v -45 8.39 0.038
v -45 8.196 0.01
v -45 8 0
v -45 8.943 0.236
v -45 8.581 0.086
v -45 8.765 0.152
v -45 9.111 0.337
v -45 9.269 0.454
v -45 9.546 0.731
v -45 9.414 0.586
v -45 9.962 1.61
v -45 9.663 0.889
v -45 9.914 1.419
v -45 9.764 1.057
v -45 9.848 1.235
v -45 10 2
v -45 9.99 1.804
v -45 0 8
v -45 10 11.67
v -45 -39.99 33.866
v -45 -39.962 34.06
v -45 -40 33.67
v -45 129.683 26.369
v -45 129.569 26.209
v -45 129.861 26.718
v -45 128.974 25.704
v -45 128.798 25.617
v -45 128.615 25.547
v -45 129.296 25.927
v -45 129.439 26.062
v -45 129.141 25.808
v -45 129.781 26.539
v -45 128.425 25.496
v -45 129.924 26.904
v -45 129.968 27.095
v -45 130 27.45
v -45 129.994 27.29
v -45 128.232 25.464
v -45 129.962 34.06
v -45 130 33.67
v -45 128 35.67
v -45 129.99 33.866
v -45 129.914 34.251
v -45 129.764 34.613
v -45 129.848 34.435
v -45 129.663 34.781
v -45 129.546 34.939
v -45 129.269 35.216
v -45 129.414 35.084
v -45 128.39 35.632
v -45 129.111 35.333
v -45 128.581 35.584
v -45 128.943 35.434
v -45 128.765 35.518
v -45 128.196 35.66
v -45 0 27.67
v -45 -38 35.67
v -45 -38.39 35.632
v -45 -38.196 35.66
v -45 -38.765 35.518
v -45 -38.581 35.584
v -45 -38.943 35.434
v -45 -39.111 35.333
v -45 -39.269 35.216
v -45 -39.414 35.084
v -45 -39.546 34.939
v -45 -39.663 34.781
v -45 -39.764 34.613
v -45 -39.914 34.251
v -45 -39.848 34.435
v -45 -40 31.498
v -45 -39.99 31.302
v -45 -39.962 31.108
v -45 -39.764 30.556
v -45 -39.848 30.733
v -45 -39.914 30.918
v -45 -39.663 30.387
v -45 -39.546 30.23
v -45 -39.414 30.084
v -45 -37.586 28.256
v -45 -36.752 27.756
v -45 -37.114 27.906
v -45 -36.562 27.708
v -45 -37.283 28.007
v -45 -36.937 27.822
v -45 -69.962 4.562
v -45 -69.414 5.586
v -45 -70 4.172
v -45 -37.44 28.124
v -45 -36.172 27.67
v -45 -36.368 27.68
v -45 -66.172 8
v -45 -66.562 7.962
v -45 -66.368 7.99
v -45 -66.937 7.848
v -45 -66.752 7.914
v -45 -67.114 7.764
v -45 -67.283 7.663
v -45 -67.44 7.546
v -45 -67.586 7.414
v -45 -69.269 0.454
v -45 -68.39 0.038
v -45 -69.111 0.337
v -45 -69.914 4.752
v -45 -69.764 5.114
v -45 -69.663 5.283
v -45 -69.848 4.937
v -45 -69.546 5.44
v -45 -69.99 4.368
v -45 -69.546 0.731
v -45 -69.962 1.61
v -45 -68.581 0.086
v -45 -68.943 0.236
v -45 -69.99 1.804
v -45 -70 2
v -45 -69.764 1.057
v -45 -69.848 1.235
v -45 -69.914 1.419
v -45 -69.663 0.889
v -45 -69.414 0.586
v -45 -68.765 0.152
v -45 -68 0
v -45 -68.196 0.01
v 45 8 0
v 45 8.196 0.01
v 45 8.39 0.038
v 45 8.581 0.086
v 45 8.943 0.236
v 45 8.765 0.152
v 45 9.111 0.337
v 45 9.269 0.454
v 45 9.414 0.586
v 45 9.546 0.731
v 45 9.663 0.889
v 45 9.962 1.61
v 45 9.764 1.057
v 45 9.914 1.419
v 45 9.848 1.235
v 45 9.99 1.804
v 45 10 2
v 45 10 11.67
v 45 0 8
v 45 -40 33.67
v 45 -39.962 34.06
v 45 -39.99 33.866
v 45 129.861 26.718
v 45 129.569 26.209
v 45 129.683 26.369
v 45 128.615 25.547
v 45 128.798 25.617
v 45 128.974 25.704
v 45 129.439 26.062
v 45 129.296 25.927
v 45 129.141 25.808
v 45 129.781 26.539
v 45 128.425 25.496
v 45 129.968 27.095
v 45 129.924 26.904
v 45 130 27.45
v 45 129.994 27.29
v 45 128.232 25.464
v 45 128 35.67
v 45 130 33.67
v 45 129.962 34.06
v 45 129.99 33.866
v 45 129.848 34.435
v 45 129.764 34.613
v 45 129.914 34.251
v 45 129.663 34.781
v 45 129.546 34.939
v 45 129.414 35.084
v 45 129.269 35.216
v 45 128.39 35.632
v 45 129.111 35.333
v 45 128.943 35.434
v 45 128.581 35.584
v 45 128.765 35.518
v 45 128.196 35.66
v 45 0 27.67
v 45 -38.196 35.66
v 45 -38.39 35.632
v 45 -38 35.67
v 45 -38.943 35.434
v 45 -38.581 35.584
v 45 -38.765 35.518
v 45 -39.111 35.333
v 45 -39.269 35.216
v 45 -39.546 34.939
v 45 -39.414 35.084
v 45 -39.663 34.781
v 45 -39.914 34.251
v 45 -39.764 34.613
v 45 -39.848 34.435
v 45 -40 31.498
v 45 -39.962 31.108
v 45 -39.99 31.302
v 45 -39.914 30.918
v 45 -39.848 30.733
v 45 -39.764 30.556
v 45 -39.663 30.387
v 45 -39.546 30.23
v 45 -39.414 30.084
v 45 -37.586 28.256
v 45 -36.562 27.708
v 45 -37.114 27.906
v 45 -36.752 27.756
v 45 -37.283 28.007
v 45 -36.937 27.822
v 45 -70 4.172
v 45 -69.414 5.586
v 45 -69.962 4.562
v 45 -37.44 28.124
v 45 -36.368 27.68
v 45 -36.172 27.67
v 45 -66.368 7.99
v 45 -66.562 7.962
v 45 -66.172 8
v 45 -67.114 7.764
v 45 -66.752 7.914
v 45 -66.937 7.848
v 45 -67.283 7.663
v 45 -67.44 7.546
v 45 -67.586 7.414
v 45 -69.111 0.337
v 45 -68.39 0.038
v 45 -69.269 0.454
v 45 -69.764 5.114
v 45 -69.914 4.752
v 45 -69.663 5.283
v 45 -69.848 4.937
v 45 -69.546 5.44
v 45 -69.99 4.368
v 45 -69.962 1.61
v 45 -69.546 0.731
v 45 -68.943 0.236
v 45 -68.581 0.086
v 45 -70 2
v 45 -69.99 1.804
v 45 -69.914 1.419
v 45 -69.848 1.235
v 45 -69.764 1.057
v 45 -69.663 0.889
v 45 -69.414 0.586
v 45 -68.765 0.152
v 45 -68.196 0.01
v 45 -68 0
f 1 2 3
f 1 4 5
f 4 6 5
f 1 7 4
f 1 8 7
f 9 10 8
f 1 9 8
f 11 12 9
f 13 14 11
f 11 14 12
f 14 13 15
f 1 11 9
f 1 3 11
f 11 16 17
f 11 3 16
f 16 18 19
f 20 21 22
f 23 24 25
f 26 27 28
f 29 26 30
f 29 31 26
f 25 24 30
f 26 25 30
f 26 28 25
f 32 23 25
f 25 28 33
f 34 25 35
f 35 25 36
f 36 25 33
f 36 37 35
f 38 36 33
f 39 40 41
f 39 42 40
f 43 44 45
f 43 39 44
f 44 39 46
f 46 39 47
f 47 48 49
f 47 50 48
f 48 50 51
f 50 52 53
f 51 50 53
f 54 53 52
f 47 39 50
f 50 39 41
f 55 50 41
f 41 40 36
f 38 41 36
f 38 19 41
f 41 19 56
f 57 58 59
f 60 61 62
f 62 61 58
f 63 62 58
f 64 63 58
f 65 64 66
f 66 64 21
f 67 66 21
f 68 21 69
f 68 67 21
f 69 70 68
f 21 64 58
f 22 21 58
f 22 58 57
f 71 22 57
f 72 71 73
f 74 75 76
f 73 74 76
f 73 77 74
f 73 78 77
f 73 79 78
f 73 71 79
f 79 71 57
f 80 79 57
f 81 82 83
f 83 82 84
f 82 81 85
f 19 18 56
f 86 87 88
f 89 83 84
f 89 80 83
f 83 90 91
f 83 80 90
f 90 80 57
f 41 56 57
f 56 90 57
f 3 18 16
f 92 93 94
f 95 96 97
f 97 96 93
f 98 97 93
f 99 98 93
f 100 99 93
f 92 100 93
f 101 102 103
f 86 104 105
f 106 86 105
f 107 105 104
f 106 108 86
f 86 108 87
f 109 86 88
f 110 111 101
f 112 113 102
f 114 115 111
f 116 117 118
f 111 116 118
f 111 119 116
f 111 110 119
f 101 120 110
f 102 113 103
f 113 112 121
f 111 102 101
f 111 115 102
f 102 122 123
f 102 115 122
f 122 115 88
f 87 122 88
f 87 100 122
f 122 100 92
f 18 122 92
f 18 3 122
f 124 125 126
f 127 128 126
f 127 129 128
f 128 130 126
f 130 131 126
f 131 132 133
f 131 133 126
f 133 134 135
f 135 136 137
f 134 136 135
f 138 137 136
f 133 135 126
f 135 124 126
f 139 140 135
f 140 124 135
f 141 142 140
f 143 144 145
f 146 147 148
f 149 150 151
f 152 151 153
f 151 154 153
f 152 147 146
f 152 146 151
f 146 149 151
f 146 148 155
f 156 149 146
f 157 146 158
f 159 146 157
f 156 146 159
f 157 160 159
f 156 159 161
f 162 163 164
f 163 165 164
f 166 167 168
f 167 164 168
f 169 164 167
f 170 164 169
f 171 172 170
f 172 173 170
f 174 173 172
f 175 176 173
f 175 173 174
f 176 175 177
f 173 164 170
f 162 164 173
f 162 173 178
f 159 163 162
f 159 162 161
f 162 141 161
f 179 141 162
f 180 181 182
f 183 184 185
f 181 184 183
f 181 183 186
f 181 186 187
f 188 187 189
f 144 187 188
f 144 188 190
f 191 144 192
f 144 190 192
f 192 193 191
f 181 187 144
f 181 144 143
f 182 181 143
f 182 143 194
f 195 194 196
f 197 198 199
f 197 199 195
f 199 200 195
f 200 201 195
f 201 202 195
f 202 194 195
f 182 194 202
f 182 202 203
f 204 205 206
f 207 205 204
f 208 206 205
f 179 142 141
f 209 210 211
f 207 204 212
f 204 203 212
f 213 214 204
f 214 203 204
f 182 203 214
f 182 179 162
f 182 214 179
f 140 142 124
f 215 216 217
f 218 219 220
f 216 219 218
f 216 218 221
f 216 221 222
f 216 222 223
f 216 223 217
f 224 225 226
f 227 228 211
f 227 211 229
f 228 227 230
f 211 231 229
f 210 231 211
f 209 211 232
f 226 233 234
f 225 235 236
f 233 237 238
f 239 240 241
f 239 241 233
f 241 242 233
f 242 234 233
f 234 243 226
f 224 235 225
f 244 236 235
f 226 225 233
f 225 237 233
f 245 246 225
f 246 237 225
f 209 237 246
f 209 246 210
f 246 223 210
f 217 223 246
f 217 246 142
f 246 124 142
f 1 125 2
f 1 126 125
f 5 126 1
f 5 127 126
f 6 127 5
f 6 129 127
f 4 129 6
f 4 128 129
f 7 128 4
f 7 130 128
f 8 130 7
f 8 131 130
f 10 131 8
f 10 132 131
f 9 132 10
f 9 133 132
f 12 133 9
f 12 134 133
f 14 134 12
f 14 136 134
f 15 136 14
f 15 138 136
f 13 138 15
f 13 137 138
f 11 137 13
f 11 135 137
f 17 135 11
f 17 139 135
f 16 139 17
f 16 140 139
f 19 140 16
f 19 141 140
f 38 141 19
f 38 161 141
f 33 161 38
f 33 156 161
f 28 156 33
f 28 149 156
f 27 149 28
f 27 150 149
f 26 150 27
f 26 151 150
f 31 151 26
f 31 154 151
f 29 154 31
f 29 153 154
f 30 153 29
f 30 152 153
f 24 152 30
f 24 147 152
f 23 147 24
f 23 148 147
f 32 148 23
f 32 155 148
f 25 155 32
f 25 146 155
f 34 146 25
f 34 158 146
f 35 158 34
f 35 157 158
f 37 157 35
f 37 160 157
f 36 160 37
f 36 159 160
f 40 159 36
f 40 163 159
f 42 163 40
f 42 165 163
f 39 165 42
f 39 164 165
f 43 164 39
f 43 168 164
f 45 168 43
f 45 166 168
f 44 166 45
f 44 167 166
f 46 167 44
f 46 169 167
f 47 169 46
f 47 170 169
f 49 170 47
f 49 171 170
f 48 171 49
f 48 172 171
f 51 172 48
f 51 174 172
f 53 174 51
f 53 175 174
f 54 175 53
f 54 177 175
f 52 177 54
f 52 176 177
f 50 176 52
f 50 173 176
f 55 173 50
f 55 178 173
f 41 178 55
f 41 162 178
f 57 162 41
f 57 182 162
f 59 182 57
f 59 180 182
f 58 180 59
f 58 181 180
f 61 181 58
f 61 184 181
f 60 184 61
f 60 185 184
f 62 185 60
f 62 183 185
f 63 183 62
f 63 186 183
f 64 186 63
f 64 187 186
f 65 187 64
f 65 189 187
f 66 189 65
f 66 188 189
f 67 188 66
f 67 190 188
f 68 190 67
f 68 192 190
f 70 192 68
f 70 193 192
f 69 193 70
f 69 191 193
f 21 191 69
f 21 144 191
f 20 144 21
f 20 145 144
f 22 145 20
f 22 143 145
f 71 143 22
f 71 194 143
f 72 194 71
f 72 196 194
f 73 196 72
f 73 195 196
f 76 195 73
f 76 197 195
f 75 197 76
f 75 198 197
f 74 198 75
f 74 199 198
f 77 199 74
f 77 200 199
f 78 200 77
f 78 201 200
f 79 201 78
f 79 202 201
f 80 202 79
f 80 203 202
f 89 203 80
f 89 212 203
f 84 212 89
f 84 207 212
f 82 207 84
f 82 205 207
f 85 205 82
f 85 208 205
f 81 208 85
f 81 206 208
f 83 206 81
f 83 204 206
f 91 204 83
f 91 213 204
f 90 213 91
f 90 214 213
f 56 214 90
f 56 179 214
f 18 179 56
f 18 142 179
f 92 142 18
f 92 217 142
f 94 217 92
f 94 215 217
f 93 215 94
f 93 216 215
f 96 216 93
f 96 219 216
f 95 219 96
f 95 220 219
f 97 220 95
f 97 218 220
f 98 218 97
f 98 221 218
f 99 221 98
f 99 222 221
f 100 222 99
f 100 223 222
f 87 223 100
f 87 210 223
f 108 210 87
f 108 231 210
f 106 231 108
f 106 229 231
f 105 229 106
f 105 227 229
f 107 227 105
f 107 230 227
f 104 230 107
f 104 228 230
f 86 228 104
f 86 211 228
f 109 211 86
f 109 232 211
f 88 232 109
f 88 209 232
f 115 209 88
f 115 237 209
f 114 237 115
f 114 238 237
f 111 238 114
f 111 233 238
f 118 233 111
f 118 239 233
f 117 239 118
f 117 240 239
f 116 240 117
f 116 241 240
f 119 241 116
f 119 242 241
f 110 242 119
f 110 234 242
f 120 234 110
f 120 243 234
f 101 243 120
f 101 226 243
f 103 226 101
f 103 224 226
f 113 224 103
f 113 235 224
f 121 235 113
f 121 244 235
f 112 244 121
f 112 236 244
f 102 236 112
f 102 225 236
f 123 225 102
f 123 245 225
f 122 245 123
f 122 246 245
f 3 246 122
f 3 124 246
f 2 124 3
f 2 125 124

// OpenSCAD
// =====================================
// Desk Armrest
// Clip-on elbow rest for a standing desk. Slides onto the tabletop edge.
// Authored in its mounted orientation (Z-up); no viewer rotation applied.
// Y = 0 is the desk edge: the tabletop sits in -Y inside the mouth, the arm
// reaches +Y. X is the width, centred on 0. The jaw underside is Z = 0.
// One YZ profile extruded along X, so it prints on its side with no supports.
// =====================================

$fn = 64;

// ---- Parameters (mm) ----
desk_t        = 19.37; // tabletop thickness
fit_clearance = 0.3;   // printed-part allowance added to the mouth gap
reach         = 130;   // arm length out from the desk edge (+Y)
width         = 90;    // pad width (X)
over_desk     = 40;    // top plate depth over the tabletop
under_desk    = 70;    // lower jaw depth under the tabletop
pad_t         = 8;     // top plate thickness
jaw_t         = 8;     // lower jaw thickness
spine_t       = 10;    // spine thickness at the desk edge
arm_root_t    = 24;    // arm thickness at the spine
arm_tip_t     = 10;    // arm thickness at the tip
lead_in       = 3;     // mouth chamfer
edge_r        = 2;     // convex profile corner radius

// ---- Derived ----
gap        = desk_t + fit_clearance;
z_jaw_top  = jaw_t;
z_desk_top = jaw_t + gap;
z_top      = z_desk_top + pad_t;

assert(desk_t > 0, "desk_t must be positive");
assert(fit_clearance >= 0, "fit_clearance must not be negative");
assert(reach > spine_t, "reach must exceed spine_t");
assert(arm_tip_t <= arm_root_t, "arm must not widen toward the tip");
assert(arm_root_t < z_top, "arm_root_t must be below the top surface");
assert(lead_in < jaw_t && lead_in < pad_t, "lead_in must be thinner than jaw and pad");
assert(lead_in < under_desk && lead_in < over_desk, "lead_in must be shorter than jaw and plate");
assert(2 * edge_r < min(jaw_t, pad_t, arm_tip_t, spine_t), "edge_r too large for thinnest section");

profile_points = [
    [-under_desk, 0],
    [spine_t, 0],
    [spine_t, z_top - arm_root_t],
    [reach, z_top - arm_tip_t],
    [reach, z_top],
    [-over_desk, z_top],
    [-over_desk, z_desk_top + lead_in],
    [-over_desk + lead_in, z_desk_top],
    [0, z_desk_top],
    [0, z_jaw_top],
    [-under_desk + lead_in, z_jaw_top],
    [-under_desk, z_jaw_top - lead_in]
];

module armrest_profile() {
    offset(r = edge_r) offset(delta = -edge_r) polygon(profile_points);
}

module desk_armrest() {
    rotate([90, 0, 90]) linear_extrude(height = width, center = true) armrest_profile();
}

desk_armrest();
